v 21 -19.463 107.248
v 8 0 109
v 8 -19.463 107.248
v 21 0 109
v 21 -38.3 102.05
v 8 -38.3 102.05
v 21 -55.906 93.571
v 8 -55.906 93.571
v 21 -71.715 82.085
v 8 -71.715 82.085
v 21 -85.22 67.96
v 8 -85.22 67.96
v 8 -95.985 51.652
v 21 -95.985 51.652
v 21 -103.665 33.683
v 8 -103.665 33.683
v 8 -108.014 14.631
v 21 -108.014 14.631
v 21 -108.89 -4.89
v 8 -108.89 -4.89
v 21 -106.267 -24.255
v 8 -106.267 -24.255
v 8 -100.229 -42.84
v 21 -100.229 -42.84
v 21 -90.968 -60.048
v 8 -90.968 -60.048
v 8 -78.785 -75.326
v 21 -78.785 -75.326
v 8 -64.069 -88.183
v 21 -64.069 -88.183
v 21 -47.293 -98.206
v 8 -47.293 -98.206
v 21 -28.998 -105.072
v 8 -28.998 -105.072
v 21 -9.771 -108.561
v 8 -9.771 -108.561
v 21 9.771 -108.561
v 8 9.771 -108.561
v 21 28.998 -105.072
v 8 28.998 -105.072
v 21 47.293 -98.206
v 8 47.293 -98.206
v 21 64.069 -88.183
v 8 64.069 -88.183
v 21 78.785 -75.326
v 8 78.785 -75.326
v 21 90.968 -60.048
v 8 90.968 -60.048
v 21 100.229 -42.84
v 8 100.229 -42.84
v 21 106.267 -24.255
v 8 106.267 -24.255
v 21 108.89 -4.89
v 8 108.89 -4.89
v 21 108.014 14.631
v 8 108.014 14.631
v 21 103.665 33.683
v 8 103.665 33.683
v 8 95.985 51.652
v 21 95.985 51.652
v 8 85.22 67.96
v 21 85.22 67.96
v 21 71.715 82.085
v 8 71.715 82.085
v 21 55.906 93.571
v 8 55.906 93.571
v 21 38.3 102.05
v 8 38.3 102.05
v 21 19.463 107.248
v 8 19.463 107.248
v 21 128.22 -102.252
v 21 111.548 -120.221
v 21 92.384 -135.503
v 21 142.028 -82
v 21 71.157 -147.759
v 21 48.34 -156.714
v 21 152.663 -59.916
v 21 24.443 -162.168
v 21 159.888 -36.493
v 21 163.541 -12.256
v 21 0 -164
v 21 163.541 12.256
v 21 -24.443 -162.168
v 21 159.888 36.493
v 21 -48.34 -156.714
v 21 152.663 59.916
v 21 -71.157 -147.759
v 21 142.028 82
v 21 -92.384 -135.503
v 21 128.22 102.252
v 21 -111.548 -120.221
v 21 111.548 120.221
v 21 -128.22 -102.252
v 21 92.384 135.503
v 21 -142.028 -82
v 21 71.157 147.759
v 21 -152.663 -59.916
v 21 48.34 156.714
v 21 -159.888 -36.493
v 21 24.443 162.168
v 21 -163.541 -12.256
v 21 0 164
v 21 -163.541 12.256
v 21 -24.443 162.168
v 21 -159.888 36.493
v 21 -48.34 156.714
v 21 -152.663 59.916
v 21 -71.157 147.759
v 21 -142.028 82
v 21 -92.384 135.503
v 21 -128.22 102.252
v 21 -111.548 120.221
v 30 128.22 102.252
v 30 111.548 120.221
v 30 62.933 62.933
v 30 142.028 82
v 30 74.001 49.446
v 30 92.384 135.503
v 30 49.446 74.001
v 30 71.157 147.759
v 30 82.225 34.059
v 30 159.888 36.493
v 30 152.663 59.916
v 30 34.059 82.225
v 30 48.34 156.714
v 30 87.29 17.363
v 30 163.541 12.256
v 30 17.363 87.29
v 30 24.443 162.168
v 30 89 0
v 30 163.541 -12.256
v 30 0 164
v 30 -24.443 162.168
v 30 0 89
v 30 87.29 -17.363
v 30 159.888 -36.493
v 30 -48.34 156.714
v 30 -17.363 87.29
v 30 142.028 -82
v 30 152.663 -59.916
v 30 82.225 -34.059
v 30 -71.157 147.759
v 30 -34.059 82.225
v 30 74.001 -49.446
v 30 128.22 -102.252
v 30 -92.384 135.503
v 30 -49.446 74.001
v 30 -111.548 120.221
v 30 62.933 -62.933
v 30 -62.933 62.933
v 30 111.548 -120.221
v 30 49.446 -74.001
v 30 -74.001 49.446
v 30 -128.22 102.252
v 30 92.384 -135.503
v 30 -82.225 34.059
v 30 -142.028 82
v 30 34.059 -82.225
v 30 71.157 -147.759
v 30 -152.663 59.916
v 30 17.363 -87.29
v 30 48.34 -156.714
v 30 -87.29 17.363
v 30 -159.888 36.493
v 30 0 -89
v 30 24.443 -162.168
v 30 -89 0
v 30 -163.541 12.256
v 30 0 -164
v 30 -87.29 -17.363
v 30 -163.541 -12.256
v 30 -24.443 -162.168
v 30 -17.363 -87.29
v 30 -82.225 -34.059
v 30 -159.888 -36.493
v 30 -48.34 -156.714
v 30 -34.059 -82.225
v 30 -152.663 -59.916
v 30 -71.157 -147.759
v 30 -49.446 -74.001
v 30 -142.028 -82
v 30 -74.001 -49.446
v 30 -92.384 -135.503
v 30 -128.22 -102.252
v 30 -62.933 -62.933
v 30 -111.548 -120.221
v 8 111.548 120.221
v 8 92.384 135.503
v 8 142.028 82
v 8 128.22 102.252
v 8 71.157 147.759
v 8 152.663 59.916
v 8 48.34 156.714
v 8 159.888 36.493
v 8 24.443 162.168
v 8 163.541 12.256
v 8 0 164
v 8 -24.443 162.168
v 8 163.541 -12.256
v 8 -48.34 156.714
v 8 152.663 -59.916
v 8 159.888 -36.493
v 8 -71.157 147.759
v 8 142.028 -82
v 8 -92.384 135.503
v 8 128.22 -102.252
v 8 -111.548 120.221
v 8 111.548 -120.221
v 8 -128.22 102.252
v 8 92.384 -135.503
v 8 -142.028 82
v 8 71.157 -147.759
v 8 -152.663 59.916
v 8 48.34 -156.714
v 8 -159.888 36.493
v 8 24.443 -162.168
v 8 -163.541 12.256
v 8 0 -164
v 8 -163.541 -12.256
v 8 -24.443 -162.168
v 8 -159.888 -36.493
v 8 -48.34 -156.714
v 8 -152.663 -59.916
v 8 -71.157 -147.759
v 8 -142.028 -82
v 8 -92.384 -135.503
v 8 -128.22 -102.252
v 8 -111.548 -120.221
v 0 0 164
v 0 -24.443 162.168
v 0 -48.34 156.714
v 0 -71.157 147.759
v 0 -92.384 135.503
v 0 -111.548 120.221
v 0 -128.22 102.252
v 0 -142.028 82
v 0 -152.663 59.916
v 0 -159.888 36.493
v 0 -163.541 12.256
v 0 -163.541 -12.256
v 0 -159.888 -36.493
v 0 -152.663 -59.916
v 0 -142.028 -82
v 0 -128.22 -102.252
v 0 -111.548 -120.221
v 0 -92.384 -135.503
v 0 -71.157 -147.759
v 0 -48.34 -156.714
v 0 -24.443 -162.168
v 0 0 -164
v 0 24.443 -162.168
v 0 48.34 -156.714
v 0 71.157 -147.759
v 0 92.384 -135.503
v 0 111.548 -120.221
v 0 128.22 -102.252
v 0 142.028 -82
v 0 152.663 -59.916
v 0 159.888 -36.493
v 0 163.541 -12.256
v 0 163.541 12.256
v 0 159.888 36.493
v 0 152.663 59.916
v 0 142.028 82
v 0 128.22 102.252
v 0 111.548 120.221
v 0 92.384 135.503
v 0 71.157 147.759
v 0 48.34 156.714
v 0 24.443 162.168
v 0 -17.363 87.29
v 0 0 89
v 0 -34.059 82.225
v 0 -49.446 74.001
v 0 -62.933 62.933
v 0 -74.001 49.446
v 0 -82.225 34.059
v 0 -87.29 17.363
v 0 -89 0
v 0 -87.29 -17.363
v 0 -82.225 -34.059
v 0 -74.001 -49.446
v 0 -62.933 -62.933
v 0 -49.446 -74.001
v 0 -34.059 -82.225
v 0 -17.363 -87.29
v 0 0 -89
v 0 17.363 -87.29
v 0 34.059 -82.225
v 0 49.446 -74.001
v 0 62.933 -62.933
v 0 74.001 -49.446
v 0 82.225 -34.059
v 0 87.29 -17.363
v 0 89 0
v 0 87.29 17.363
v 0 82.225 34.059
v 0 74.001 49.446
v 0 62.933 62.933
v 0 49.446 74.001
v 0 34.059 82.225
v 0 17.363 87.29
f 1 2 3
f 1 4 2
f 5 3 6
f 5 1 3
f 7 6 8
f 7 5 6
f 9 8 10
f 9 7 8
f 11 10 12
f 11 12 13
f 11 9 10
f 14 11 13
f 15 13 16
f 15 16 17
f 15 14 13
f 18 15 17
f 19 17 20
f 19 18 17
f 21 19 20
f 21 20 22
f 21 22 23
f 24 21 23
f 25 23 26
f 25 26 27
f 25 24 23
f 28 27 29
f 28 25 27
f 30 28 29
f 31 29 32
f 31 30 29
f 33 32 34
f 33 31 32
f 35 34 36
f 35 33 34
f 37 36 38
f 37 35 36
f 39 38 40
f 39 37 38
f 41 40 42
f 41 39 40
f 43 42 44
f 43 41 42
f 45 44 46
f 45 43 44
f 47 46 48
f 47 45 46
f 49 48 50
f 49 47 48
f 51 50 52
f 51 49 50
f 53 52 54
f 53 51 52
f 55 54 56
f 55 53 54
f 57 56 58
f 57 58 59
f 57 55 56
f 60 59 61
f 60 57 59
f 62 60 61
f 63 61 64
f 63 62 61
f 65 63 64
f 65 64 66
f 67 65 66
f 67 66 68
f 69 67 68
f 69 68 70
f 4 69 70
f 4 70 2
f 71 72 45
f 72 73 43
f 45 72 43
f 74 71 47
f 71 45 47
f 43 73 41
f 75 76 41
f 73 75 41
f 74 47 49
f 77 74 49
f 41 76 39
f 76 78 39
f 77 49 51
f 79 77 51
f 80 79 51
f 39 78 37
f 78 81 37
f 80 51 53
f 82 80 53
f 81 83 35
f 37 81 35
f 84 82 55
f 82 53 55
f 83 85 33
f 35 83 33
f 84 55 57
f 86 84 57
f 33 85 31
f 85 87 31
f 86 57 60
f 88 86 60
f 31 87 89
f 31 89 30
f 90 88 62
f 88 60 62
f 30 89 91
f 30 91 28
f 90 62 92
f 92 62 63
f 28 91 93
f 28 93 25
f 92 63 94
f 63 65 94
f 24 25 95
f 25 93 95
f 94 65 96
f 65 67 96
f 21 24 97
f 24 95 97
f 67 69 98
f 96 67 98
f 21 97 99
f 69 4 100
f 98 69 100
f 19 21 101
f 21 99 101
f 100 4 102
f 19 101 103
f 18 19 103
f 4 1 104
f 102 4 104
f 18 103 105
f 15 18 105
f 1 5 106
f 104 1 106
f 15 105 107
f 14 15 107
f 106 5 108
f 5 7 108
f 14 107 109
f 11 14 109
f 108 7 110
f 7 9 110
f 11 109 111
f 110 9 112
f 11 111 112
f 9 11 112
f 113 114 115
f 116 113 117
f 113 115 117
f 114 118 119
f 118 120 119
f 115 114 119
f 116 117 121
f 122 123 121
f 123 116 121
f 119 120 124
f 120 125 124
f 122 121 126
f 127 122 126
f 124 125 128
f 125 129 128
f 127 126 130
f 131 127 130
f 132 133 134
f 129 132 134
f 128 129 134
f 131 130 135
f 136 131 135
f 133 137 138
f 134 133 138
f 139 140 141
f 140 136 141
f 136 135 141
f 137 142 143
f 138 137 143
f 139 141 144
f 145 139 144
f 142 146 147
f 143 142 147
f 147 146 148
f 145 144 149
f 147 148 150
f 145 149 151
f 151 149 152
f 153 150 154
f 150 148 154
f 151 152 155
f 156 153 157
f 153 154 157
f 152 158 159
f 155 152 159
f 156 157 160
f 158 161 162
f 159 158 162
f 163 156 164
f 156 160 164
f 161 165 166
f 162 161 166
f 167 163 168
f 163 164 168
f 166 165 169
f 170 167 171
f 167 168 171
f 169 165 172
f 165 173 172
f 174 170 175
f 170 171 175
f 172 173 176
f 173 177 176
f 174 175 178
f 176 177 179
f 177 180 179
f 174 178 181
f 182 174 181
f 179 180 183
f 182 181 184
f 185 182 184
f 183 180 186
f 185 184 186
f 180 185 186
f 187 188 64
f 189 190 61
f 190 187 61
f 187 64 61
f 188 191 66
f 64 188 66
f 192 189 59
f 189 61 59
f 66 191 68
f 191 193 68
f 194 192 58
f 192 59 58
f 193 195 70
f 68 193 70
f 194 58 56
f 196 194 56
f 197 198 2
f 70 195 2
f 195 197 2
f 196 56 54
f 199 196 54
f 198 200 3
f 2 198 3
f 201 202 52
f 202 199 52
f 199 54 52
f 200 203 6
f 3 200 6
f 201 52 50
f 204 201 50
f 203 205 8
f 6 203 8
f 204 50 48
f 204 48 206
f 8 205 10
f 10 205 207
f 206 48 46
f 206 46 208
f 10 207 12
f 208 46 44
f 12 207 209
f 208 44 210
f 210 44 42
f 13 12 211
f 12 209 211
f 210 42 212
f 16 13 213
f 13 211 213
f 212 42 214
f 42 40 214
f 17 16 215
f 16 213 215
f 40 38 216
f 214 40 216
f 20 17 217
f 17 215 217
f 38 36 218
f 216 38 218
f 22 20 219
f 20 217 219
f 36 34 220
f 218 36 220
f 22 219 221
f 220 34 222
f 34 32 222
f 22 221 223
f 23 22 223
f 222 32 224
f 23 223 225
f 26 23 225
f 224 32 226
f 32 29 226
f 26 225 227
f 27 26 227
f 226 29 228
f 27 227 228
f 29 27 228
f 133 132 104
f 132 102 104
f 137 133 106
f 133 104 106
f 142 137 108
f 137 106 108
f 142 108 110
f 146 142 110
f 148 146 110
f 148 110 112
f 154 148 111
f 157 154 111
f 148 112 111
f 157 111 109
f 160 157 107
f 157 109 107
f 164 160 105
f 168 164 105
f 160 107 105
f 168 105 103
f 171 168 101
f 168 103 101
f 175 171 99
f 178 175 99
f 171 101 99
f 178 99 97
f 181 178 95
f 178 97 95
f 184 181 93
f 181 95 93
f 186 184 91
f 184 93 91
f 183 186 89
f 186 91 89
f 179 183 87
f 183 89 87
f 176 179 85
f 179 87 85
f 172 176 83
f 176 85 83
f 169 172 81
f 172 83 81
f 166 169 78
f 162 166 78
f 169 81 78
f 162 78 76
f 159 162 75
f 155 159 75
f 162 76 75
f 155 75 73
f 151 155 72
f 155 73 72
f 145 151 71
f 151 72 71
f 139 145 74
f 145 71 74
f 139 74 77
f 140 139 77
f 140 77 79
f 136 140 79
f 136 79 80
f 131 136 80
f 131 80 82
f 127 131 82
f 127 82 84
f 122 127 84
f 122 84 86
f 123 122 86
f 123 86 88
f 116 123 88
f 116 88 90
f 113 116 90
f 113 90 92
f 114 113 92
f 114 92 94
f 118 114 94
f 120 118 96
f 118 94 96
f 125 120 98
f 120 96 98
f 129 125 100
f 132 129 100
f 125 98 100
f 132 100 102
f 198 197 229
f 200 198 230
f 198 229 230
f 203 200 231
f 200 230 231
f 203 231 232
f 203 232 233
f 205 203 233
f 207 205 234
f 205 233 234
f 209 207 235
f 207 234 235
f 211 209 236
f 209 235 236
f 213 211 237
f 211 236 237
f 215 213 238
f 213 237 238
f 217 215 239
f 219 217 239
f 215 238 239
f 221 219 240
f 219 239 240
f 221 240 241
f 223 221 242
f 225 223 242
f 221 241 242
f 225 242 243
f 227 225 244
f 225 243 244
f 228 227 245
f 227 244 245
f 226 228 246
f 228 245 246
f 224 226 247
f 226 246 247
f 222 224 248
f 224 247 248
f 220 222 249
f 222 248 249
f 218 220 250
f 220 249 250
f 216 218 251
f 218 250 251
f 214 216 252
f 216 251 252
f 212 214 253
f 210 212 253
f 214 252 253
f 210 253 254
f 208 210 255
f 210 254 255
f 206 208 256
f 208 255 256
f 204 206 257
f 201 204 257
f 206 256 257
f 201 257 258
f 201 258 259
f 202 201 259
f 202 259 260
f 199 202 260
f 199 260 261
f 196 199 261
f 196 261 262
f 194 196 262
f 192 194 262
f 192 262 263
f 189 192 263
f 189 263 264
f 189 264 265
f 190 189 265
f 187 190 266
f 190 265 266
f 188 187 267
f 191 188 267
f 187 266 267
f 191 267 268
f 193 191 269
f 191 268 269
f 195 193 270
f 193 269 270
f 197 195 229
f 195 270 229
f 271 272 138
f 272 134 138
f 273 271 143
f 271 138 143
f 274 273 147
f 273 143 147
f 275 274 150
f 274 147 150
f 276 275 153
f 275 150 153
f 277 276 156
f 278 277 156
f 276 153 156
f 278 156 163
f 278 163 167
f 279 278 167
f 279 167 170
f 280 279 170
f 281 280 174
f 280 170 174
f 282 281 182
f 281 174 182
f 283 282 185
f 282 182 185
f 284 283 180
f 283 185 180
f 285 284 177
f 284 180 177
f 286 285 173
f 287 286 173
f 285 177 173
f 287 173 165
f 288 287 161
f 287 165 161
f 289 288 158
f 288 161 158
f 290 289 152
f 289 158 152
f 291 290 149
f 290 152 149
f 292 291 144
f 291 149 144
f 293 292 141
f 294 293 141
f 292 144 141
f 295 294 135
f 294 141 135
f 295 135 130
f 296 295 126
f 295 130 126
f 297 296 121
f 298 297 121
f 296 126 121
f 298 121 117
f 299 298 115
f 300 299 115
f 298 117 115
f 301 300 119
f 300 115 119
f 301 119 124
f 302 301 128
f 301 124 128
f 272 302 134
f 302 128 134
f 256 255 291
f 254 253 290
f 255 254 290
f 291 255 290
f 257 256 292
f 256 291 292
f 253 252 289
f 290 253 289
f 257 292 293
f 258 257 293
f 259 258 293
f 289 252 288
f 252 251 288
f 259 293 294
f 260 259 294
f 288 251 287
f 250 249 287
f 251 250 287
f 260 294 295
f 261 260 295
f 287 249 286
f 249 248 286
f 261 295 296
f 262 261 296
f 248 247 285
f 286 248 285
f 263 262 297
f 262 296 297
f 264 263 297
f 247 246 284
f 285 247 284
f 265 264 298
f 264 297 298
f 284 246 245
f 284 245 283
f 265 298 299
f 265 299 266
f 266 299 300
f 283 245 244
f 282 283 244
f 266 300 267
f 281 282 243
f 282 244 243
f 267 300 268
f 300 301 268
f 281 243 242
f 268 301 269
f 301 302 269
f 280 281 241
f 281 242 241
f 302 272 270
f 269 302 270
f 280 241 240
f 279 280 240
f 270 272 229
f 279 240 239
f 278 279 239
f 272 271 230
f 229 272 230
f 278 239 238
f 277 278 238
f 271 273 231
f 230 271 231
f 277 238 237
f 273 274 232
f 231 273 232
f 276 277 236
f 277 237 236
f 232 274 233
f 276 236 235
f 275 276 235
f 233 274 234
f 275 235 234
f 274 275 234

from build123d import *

# Parameters (mm, degrees)
F0_W   = 8
F0_H   = 8.5
F0_W_2 = 13
F0_H_2 = 11.5
F0_W_3 = 9


with BuildPart() as f1:
    # F0 (on Front) → F1 (revolve)
    with BuildSketch(Plane.XZ):
        Polygon((0, 164), (0, 97.5), (8, 97.5), (8, 109), (8, 164), align=None)
        with Locations((4, 93.25)):
            Rectangle(F0_W, F0_H)
        Polygon((21, 109), (21, 97.5), (30, 97.5), (30, 164), (21, 164), align=None)
        with Locations((14.5, 103.25)):
            Rectangle(F0_W_2, F0_H_2)
        with Locations((14.5, 93.25)):
            Rectangle(F0_W_2, F0_H)
        with Locations((25.5, 93.25)):
            Rectangle(F0_W_3, F0_H)
    revolve(axis=Axis((49, 0, 0), (1, 0, 0)))


solid = f1.part
